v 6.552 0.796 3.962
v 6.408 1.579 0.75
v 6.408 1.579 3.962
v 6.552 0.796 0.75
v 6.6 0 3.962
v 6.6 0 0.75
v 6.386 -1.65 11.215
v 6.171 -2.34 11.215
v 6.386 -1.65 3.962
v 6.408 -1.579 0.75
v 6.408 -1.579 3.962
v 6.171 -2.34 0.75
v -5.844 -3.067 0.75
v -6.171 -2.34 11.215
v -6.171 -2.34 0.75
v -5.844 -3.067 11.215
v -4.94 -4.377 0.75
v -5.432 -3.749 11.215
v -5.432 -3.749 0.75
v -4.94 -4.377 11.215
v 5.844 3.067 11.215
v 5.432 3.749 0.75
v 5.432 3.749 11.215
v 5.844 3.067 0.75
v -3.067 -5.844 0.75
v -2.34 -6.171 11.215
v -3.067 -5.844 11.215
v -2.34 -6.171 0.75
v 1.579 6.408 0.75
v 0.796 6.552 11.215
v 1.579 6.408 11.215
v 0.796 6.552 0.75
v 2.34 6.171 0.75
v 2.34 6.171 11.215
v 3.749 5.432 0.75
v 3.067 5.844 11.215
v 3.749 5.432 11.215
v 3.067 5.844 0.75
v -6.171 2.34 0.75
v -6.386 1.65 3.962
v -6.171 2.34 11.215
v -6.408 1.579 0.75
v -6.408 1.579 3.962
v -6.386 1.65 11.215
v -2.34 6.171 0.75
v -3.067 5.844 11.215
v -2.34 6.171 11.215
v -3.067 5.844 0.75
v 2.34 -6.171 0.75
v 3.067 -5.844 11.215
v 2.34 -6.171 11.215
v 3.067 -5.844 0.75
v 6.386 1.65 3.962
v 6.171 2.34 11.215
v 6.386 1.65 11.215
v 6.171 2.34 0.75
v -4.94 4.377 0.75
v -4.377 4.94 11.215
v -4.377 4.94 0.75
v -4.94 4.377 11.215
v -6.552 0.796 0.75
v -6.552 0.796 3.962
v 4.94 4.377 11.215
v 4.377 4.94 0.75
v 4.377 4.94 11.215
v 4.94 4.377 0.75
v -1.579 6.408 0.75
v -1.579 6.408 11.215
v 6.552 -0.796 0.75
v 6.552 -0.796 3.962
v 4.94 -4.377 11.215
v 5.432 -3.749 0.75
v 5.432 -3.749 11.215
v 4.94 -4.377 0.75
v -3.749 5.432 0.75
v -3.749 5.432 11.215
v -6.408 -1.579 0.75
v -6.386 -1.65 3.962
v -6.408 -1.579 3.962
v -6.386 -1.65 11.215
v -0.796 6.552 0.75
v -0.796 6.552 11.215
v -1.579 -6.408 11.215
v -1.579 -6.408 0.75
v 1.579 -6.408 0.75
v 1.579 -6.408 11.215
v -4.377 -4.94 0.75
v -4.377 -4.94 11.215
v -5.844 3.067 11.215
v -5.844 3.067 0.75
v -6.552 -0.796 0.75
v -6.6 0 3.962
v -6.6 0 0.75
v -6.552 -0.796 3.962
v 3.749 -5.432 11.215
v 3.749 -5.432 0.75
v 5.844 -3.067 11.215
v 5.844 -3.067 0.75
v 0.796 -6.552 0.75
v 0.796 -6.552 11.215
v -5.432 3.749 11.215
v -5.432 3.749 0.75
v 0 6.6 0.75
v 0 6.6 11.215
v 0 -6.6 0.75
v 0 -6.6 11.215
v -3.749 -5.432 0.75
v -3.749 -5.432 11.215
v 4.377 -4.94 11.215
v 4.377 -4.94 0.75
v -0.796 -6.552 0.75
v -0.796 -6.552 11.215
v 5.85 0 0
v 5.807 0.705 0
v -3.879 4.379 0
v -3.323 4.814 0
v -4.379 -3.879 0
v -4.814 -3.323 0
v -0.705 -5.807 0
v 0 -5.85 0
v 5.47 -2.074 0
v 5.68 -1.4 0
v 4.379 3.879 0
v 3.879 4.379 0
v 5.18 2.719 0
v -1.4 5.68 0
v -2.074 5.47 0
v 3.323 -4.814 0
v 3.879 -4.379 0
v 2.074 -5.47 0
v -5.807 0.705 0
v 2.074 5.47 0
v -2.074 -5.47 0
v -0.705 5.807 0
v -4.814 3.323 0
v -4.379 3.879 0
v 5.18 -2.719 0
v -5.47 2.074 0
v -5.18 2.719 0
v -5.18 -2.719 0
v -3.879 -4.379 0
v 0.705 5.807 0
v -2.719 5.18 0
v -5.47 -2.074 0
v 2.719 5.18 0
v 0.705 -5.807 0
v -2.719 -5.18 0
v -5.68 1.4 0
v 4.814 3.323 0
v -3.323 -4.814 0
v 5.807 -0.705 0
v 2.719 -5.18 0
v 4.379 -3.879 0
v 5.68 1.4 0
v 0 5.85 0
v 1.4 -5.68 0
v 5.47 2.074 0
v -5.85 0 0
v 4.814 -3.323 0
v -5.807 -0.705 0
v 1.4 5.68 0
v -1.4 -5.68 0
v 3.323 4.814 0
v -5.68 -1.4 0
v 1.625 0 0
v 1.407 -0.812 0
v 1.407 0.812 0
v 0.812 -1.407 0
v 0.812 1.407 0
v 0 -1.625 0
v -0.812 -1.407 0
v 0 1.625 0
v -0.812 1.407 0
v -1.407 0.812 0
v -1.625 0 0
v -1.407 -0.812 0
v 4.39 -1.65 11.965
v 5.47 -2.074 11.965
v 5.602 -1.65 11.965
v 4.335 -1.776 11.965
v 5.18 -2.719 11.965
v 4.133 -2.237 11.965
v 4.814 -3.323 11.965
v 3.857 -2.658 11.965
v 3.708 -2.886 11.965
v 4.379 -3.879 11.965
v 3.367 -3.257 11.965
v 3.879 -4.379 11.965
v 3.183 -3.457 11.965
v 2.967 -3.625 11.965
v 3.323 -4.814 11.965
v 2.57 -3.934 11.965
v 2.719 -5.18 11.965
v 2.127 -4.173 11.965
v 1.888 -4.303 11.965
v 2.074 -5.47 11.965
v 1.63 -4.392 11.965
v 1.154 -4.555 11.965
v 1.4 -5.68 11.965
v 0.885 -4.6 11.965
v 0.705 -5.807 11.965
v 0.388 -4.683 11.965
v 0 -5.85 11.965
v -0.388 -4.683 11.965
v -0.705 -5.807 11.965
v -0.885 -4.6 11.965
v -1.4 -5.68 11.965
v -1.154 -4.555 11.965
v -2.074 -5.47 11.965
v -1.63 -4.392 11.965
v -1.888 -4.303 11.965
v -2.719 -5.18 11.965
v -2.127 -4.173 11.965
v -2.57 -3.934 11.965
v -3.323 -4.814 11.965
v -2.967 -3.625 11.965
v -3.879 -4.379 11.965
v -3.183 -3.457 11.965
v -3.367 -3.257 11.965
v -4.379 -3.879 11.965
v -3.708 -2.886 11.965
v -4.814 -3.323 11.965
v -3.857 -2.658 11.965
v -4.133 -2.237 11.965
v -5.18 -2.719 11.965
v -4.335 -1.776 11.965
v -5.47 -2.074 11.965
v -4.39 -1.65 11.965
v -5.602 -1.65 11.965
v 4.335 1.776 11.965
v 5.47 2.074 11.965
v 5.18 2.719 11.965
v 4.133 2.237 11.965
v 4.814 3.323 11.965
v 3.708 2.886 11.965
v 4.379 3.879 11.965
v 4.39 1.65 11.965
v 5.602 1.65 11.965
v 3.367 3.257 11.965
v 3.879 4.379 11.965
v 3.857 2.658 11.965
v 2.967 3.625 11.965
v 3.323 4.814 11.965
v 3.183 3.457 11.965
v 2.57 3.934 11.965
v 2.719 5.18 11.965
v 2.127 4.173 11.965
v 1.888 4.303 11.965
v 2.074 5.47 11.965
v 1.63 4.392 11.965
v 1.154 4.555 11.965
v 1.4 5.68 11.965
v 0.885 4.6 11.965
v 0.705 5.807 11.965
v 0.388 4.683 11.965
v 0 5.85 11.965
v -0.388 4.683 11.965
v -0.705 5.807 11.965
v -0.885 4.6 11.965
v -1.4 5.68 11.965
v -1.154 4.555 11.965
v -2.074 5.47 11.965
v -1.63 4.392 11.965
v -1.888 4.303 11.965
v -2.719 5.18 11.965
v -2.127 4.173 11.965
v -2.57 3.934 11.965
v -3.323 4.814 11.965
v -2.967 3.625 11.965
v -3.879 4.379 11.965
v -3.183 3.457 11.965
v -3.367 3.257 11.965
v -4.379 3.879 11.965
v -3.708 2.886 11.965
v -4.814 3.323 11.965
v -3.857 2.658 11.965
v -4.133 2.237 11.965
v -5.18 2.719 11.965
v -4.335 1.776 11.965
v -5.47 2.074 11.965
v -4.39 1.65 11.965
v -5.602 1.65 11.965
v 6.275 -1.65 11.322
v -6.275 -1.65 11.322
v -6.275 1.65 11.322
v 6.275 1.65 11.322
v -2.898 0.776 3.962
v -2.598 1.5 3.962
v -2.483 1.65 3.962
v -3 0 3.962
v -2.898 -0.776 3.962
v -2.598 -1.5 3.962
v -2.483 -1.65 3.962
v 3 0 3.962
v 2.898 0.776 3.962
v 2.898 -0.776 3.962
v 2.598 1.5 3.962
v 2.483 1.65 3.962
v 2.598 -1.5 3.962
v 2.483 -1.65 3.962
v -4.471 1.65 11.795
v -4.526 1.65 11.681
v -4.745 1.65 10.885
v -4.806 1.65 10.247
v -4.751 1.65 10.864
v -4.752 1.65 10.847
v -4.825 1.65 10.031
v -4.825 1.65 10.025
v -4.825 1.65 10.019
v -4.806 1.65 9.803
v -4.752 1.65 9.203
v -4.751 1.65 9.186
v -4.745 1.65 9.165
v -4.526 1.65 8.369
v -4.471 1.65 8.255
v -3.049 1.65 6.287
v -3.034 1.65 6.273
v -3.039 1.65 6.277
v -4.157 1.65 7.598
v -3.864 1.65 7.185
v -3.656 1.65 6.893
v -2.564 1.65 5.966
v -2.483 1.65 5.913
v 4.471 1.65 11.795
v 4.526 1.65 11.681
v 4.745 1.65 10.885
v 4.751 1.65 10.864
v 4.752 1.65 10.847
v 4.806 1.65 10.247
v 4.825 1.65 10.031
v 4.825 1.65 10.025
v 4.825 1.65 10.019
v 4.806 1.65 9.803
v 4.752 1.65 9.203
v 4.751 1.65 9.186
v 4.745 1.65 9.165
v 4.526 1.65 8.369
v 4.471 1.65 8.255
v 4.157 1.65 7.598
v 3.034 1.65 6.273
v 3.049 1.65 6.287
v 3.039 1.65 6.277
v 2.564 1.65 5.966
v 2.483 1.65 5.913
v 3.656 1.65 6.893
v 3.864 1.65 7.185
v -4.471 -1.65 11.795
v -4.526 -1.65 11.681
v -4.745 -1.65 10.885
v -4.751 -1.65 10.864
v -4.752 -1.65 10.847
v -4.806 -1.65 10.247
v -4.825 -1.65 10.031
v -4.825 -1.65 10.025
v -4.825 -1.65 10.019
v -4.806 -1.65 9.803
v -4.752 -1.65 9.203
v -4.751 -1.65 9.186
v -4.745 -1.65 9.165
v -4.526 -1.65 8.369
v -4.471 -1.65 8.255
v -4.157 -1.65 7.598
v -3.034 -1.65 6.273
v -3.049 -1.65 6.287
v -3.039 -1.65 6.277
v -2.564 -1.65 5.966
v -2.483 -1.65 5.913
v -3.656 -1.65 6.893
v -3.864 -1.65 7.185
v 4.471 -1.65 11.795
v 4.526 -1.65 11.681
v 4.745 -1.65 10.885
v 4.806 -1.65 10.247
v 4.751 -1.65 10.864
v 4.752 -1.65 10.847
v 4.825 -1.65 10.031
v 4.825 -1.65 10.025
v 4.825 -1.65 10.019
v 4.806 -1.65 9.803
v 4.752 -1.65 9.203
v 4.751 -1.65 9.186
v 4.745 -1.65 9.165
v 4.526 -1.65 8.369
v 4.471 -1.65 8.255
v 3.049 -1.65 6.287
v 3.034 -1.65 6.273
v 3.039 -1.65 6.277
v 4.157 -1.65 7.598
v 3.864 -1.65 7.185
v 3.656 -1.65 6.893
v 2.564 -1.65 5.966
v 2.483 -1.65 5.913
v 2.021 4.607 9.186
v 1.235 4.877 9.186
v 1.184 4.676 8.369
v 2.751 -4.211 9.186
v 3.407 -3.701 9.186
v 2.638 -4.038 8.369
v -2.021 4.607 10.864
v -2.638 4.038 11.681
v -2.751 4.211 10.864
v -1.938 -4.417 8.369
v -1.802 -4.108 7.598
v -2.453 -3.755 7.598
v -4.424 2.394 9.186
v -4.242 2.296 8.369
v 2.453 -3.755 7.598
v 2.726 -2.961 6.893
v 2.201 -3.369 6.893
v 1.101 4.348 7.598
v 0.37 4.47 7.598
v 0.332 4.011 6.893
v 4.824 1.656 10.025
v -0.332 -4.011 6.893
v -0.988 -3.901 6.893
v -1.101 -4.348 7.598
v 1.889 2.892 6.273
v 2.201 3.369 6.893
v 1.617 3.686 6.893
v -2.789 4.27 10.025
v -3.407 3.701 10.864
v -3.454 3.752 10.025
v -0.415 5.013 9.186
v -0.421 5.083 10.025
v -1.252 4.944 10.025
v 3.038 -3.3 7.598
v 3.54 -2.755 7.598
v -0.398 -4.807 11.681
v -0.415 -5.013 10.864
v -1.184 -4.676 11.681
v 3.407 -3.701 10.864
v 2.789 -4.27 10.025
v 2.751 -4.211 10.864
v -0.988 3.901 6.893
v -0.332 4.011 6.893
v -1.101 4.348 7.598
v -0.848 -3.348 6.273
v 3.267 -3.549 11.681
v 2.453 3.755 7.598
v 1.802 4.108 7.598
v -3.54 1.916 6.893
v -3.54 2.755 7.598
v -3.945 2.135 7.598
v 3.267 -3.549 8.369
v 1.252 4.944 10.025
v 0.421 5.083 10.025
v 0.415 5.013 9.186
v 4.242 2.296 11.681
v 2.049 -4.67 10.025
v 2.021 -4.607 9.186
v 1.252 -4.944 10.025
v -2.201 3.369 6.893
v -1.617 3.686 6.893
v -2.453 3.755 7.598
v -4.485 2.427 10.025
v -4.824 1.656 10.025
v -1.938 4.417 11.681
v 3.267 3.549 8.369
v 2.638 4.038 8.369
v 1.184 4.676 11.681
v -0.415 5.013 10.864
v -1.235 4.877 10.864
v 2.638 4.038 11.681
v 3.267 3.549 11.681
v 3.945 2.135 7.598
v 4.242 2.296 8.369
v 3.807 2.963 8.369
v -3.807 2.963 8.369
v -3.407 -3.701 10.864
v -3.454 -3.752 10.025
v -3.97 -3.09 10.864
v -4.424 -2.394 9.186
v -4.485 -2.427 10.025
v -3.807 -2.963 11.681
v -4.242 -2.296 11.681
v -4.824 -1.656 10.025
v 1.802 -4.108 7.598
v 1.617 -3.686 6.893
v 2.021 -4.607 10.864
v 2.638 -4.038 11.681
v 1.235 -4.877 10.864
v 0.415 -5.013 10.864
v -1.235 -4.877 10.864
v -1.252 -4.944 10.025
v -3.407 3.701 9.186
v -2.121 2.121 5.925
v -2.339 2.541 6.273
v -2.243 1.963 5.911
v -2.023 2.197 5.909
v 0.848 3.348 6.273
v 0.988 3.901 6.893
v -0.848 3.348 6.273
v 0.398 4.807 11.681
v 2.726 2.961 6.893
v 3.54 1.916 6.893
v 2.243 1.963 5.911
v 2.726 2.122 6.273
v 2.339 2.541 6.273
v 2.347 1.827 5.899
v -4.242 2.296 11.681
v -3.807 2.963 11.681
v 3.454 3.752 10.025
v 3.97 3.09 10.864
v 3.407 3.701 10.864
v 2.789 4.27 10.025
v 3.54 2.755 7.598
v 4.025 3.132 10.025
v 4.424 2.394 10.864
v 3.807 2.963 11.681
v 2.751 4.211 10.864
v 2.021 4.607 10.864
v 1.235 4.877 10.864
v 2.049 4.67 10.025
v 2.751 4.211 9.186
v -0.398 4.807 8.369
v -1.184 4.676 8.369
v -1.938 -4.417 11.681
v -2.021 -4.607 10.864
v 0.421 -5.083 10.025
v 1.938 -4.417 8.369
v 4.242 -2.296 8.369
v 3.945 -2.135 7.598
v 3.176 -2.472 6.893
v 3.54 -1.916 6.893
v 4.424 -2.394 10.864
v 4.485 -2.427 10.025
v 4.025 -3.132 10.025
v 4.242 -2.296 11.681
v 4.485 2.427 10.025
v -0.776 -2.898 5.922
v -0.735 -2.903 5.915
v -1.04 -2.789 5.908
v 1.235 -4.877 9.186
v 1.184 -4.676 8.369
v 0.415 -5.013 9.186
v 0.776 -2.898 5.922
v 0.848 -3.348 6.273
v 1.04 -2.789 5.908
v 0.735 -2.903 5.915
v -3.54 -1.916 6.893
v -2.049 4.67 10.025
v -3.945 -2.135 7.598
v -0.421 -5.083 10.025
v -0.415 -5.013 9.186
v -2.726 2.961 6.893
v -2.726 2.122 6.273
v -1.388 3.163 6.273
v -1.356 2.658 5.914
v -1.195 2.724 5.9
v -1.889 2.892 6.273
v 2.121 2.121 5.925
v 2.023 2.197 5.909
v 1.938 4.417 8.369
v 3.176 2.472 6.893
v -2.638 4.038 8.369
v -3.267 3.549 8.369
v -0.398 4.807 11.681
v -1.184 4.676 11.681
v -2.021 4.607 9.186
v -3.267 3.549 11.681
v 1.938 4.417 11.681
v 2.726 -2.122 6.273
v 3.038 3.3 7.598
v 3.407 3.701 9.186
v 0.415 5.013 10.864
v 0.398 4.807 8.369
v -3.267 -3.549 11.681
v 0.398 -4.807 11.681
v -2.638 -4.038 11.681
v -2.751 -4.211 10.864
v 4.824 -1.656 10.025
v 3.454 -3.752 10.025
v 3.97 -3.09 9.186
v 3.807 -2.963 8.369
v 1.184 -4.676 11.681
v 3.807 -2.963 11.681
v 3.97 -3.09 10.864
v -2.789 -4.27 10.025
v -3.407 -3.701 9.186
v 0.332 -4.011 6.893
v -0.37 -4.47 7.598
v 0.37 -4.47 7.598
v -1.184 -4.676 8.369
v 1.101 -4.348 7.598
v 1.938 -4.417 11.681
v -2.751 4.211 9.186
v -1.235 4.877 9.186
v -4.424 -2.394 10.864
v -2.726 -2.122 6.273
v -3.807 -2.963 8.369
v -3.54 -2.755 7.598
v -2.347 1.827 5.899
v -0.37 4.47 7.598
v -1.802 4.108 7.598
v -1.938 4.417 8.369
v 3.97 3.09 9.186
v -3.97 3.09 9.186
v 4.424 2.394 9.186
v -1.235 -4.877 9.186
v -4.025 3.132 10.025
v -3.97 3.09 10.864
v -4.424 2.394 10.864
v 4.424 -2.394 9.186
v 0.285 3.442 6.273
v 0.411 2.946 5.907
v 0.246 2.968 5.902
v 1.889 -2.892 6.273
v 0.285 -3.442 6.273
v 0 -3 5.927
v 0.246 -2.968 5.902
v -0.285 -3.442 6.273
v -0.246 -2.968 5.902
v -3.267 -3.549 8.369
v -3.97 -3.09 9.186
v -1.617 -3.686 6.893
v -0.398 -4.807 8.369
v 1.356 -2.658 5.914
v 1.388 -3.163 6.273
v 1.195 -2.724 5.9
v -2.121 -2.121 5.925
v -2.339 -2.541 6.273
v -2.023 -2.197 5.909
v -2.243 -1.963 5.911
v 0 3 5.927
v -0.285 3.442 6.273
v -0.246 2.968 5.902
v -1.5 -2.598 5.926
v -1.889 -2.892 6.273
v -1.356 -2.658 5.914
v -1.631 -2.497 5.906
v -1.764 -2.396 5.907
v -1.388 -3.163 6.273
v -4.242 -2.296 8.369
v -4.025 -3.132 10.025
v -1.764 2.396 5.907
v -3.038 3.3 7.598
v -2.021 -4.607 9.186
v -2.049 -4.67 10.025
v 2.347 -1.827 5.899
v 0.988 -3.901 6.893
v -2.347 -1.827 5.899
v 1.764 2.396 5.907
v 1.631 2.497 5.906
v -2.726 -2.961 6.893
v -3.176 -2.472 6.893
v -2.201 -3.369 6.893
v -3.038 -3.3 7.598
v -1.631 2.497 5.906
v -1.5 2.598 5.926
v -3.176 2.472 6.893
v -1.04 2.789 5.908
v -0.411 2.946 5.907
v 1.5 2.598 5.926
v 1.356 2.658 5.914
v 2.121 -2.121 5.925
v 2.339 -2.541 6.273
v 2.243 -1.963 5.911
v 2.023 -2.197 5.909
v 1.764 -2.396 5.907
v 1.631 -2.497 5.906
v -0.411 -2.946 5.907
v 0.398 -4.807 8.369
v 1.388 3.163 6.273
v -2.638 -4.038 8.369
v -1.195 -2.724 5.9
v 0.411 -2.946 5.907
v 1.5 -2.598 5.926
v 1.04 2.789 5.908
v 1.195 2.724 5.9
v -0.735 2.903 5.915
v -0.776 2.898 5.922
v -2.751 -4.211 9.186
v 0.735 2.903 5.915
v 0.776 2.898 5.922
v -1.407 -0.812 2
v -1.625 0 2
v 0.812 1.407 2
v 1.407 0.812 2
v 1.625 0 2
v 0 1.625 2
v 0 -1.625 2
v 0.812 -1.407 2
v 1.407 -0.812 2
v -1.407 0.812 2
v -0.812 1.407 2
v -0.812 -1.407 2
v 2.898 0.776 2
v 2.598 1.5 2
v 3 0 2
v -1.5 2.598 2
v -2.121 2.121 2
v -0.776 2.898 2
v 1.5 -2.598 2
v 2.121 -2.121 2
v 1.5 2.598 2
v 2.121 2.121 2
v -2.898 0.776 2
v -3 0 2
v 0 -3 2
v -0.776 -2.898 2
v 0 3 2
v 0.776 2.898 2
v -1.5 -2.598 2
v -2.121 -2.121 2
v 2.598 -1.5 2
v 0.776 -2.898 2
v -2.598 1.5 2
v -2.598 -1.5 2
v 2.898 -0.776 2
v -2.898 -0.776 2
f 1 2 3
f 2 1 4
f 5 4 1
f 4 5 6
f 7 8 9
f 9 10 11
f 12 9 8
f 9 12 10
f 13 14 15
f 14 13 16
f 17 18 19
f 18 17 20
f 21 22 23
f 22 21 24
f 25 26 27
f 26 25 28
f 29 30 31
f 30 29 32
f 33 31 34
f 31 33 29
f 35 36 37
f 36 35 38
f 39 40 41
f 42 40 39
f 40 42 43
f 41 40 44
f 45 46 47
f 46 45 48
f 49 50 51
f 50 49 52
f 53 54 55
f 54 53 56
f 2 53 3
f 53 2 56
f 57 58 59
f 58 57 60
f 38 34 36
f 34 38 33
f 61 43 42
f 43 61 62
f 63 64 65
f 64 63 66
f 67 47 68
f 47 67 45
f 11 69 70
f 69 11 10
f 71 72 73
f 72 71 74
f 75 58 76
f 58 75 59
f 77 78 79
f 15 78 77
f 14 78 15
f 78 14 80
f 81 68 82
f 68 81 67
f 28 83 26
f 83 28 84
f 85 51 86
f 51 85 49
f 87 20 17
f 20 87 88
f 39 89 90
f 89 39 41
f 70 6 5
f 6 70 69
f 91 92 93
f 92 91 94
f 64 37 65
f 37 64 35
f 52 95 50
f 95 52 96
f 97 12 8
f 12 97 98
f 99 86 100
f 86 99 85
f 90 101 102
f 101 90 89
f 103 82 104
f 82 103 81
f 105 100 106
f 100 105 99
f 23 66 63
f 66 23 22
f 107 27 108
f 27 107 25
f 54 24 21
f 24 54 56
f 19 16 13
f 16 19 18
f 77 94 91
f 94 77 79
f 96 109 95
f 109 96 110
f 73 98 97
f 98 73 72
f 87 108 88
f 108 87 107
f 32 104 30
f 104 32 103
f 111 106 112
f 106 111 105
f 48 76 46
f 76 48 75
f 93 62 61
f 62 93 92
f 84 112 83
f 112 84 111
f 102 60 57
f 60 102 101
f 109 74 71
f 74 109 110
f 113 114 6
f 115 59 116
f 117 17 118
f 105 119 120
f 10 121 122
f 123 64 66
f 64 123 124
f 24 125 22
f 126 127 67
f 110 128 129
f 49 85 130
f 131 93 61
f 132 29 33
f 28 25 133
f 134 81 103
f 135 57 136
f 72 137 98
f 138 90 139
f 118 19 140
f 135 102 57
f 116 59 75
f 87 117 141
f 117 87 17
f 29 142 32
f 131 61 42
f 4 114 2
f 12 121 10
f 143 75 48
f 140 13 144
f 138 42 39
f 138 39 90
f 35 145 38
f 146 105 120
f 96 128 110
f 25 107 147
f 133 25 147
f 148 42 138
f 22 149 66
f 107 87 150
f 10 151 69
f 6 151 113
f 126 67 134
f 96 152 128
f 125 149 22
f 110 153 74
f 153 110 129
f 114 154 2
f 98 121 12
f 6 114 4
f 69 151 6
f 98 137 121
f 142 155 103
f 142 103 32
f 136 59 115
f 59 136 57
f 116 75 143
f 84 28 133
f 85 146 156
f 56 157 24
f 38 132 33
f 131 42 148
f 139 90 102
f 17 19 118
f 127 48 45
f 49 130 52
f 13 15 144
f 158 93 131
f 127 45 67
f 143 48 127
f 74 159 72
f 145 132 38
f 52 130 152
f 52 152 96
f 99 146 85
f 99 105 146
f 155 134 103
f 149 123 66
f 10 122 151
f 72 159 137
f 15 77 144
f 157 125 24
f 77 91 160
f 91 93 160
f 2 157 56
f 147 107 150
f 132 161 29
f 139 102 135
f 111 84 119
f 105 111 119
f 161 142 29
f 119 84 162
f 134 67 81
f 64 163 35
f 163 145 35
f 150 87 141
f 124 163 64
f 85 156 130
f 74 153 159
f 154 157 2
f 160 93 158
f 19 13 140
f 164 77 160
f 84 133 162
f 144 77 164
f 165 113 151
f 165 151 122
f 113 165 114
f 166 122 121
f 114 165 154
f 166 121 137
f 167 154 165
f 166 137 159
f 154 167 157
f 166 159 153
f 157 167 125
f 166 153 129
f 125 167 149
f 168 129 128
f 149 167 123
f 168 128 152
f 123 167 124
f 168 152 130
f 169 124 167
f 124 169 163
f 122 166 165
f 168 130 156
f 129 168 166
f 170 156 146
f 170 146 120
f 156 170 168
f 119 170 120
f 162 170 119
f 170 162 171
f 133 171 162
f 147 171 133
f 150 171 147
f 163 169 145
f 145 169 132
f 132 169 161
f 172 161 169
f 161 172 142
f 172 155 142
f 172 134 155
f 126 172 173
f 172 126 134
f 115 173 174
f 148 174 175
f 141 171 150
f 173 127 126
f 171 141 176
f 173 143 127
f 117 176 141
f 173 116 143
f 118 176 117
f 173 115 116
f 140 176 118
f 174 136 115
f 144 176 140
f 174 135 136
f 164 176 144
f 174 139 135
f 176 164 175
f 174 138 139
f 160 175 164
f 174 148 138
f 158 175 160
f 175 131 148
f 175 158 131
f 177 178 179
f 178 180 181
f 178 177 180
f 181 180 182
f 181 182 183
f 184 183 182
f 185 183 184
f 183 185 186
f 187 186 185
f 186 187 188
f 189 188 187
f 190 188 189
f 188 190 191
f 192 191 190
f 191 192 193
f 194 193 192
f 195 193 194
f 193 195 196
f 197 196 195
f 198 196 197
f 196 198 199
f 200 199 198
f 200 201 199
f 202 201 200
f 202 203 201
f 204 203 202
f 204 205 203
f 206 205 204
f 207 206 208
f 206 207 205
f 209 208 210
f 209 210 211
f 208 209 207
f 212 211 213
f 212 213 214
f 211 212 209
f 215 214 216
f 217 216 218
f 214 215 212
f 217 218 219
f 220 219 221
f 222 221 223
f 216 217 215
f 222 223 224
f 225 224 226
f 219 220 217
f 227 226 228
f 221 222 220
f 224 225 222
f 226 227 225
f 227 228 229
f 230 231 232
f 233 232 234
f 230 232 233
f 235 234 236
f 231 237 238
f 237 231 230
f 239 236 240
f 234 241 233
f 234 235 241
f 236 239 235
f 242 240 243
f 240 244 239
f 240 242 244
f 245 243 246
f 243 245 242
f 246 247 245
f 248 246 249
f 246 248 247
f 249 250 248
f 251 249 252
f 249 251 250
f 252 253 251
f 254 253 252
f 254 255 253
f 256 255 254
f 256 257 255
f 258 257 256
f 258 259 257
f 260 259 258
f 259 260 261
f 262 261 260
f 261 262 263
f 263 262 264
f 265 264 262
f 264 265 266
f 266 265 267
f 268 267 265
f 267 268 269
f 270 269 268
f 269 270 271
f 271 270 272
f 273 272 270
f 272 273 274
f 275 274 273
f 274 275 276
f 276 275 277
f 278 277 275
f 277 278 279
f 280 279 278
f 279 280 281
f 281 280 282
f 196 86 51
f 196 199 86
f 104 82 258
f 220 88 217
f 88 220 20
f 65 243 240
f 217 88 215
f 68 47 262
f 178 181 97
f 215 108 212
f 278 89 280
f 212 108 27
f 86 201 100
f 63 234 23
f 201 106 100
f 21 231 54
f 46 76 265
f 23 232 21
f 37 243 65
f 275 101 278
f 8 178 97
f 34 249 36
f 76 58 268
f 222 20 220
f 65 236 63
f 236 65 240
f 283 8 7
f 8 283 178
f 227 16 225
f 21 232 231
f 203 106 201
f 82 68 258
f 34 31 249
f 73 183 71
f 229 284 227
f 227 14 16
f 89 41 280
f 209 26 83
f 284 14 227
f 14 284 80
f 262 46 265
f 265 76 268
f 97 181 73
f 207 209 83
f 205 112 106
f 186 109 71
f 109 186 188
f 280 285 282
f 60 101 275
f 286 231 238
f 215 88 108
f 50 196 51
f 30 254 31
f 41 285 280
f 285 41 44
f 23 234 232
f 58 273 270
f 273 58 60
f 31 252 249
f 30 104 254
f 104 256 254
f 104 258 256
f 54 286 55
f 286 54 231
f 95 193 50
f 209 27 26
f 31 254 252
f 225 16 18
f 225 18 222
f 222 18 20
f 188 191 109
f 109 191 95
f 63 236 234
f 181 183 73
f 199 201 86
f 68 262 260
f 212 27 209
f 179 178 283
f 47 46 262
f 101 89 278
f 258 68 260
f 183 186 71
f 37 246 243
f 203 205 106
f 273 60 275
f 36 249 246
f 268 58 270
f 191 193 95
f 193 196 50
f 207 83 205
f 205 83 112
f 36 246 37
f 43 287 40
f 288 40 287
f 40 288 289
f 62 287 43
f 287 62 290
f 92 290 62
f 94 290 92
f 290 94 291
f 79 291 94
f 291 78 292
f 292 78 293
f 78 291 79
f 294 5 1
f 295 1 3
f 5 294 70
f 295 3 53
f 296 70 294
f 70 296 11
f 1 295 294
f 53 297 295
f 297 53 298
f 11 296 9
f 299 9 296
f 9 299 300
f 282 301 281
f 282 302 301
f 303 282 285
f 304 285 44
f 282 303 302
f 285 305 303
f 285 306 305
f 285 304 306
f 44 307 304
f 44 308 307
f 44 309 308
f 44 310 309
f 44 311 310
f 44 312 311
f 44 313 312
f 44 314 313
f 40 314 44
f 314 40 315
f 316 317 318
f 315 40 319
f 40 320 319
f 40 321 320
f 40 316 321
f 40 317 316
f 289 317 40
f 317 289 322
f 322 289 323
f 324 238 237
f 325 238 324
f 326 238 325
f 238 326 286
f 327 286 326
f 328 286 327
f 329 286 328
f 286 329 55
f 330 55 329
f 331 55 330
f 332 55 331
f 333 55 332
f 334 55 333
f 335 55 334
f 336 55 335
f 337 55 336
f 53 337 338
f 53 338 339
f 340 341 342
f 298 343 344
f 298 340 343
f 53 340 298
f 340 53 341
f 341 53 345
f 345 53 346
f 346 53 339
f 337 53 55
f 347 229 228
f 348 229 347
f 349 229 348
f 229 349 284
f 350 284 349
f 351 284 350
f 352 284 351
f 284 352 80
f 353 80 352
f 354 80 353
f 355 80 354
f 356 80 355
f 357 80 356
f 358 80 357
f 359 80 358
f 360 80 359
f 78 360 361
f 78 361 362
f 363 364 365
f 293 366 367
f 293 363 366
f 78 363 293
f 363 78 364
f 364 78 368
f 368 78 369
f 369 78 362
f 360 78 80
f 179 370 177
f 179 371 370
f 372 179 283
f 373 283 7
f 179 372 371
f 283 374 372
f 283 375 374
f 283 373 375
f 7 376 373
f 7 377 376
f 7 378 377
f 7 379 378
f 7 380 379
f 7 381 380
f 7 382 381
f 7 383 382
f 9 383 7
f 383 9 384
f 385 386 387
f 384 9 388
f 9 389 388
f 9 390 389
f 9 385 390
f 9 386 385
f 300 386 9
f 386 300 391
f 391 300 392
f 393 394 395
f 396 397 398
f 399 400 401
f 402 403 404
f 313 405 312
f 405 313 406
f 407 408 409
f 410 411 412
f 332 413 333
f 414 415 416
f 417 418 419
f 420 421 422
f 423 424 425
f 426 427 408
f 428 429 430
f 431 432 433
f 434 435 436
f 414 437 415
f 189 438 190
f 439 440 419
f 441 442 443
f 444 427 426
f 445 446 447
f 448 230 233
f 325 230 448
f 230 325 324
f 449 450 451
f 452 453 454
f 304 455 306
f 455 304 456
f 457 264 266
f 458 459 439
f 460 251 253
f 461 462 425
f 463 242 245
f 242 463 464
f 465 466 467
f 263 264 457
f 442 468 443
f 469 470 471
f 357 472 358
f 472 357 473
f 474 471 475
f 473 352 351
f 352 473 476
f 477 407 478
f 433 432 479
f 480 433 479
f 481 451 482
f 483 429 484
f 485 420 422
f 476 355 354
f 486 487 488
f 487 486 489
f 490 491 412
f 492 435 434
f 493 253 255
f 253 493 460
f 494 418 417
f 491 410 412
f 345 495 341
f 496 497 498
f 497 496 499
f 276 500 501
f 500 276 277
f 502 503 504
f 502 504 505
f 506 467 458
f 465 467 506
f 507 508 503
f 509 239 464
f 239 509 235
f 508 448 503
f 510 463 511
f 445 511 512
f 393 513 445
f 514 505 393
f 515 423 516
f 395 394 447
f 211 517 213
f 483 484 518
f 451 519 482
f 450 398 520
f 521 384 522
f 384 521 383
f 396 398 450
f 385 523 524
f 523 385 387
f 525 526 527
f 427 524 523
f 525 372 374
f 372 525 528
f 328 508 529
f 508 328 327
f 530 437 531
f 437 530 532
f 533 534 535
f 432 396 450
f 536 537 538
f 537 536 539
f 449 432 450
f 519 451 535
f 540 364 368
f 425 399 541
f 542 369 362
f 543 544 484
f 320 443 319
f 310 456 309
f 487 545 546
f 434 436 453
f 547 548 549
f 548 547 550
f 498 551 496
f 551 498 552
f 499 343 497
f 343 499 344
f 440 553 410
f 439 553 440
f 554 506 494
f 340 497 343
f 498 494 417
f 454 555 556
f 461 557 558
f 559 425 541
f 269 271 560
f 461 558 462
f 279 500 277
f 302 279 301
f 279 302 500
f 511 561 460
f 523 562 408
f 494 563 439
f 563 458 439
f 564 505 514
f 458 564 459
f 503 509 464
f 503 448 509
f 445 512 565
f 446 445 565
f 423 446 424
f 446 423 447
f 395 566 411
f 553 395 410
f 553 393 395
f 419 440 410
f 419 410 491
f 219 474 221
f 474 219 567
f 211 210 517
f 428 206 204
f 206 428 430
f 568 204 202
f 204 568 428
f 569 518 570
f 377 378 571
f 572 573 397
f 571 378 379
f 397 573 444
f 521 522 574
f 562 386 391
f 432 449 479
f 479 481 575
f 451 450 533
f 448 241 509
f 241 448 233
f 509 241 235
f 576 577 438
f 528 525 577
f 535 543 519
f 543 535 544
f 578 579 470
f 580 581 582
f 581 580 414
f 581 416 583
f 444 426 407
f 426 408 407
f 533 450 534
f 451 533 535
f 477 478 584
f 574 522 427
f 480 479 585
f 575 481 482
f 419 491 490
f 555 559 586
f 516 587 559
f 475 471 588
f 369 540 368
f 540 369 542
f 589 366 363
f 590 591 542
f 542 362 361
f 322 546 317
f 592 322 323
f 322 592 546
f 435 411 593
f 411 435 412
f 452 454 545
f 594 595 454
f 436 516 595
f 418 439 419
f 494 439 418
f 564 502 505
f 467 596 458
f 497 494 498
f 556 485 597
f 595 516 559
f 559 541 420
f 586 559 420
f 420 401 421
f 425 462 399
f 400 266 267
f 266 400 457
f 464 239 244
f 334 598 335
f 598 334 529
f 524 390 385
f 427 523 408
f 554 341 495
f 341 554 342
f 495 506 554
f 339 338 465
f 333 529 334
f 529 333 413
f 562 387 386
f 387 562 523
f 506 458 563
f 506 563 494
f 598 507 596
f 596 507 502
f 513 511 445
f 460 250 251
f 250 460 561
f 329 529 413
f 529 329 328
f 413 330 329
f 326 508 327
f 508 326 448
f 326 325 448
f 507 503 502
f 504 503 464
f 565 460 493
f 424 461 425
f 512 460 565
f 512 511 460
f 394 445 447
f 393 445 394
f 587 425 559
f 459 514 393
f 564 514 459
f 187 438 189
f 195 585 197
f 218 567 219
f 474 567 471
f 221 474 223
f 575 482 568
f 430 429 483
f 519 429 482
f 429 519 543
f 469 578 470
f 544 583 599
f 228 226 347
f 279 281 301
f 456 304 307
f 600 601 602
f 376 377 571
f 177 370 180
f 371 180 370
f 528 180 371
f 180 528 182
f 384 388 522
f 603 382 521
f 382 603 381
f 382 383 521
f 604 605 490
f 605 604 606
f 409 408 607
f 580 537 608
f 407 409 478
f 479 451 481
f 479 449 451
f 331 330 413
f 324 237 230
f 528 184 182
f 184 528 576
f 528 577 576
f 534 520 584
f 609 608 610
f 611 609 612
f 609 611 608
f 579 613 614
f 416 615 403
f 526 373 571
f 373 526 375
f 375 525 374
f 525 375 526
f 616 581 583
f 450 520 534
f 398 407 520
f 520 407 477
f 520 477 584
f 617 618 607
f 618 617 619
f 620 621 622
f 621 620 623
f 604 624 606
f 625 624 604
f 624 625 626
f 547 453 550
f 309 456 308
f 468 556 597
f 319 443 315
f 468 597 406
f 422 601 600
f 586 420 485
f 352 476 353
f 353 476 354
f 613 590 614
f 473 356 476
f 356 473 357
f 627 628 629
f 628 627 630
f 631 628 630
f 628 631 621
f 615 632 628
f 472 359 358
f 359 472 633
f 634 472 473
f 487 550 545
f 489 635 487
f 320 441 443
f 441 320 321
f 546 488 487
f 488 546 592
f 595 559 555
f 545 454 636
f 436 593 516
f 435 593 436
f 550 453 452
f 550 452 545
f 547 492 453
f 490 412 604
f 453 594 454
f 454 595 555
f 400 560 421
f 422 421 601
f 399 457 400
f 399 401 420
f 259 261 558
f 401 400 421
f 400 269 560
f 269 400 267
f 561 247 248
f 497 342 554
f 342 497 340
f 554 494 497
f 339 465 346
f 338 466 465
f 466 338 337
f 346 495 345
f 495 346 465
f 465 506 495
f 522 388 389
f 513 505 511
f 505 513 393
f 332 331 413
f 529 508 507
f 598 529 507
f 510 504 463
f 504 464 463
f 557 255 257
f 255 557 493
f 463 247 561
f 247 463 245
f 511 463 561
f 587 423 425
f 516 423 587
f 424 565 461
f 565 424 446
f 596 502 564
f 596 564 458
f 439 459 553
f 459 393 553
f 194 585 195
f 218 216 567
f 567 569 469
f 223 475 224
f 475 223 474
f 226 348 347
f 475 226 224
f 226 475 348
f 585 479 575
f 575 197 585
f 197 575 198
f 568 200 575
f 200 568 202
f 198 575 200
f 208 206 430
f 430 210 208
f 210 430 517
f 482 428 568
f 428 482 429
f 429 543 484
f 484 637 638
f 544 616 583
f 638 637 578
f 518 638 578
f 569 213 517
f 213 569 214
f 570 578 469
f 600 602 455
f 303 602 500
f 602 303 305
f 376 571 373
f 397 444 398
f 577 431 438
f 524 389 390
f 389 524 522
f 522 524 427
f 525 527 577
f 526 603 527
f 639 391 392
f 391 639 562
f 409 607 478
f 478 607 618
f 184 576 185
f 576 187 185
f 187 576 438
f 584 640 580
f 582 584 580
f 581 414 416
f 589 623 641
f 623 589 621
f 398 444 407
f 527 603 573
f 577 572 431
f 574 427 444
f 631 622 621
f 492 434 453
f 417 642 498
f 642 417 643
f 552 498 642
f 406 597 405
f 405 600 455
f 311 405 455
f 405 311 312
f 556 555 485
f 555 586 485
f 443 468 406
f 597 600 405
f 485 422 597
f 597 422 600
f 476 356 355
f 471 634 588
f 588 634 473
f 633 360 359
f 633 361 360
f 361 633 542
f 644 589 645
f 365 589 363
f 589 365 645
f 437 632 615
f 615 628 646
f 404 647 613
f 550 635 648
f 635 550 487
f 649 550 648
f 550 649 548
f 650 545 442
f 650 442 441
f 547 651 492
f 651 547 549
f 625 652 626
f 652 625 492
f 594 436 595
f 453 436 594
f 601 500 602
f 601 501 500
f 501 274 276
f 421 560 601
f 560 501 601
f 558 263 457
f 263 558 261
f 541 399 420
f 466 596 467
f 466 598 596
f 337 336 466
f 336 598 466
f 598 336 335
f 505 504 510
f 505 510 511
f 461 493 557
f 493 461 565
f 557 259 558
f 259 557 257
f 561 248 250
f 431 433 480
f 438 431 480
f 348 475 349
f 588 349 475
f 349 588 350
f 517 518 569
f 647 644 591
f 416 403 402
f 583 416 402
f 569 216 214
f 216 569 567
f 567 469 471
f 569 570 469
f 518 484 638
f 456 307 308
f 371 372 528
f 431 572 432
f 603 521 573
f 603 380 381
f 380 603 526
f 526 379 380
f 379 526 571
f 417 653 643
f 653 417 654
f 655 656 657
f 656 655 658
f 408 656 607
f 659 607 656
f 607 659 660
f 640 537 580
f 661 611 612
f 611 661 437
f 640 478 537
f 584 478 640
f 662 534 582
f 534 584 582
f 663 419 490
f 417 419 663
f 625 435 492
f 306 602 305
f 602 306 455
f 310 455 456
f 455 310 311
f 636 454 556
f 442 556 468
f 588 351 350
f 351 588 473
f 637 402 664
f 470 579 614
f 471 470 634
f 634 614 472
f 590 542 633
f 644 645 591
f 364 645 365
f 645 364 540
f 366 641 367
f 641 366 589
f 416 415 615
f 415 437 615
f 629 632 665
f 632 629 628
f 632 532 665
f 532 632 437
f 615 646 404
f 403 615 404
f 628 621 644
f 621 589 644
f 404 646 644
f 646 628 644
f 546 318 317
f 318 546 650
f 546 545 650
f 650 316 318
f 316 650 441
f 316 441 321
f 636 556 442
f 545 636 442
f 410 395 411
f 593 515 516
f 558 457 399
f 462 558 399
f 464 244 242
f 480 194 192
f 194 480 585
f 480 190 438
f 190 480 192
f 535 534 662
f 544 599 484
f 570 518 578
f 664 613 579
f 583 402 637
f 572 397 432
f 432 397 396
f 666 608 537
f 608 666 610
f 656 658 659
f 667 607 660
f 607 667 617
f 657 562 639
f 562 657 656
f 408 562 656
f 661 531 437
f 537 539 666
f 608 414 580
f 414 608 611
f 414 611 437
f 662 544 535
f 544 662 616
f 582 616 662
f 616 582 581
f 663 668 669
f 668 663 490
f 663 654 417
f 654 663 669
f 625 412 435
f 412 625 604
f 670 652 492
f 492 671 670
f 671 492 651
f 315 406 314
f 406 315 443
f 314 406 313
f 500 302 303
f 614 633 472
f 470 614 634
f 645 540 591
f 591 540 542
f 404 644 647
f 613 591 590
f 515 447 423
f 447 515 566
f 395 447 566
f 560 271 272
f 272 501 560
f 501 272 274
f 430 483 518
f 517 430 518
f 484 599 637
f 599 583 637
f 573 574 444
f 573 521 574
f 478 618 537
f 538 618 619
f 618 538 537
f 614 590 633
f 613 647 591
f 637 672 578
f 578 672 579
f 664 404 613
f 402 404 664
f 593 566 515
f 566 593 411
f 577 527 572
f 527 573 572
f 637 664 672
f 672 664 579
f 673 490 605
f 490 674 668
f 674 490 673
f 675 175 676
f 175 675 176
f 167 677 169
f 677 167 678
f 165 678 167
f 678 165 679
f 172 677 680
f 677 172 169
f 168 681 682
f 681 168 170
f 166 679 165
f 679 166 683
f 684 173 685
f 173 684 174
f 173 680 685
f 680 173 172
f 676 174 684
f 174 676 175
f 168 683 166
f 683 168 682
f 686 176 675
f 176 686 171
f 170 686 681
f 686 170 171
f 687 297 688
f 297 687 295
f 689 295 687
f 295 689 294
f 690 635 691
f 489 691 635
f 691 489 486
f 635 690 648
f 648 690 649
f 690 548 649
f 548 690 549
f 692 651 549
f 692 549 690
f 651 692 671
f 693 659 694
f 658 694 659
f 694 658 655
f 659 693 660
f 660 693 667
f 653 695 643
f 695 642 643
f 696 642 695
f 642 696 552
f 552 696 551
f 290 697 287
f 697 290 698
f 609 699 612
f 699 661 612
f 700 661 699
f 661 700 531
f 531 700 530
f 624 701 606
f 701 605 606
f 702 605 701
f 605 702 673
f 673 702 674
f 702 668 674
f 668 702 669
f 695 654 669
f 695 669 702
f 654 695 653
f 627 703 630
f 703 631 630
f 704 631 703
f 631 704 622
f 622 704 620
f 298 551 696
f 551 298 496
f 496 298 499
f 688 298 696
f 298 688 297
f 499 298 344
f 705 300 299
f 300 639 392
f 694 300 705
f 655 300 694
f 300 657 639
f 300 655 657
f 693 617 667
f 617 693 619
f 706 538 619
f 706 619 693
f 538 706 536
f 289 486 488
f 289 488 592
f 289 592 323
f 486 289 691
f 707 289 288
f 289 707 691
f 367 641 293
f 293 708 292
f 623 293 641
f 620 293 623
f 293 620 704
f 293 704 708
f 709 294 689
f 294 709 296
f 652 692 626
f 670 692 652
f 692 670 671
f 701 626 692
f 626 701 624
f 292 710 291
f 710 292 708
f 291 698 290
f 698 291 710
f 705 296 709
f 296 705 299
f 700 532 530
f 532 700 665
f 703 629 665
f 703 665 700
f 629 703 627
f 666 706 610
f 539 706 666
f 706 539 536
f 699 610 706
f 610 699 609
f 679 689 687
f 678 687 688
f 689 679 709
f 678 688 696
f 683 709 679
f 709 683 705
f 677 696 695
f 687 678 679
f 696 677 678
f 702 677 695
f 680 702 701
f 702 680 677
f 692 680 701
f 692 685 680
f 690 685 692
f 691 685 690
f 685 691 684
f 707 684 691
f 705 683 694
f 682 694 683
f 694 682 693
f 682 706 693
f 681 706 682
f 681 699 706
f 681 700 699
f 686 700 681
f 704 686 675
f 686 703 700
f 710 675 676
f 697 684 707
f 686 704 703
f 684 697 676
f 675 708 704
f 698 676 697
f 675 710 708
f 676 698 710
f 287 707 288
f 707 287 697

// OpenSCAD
// Ballcaster (part of Escornabot Project)
// (c) 2015, Xoan Sampaiño
//
// Based on BallCasterV2 by PieterBos
// http://www.thingiverse.com/thing:20471
//
// Released under the MIT License

ball_size = 9.7; // ball diameter
airgap = 0.25;    // gap between ball and wall

recess = 11;   // distance from ball to rear
hole_sep = 39; // distance between mounting holes

wall_thickness = 1.5;
total_height = 9.5*1.25-1+4;	// this includes the ball
ball_protrude = 0.30;	// percentage of ball radius sticking out
chamfer = 0.75;

// set fn to false to automatic face number calculation
// useful in some cases (i.e. to import into freecad)
fn = true;



overlap = 1; // to use in some differences

cyl_rad = (ball_size/2) + wall_thickness + airgap;
echo (cyl_rad);

module ball_mount () {
  difference () {
    union() {
      translate([0, 0, chamfer])
        cylinder(r = cyl_rad, h = total_height-(ball_size*ball_protrude)-chamfer*2, $fn = fn ? round(cyl_rad*2)*4 : 0);

      // bottom chamfer
      cylinder(r1 = cyl_rad-chamfer, r2 = cyl_rad, h = chamfer, $fn = fn ? round(cyl_rad*2)*4 : 0);

      // top chamfer
      translate([0, 0, total_height-(ball_size*ball_protrude)-chamfer])
        cylinder(r1 = cyl_rad, r2 = cyl_rad-chamfer, h = chamfer, $fn = fn ? round(cyl_rad*2)*4 : 0);
    }

    translate([0, 0, total_height-ball_size/2])
      for (i = [0])
        rotate([0, 0, i])
          cube(size = [cyl_rad*2+5, cyl_rad/2, ball_size*1.25], center = true );

    translate([0, 0, total_height-(ball_size/2)]) {
      %sphere (ball_size/2, $fn = fn ? ball_size*4 : 0);
      sphere (ball_size/2+airgap, $fn = fn ? ball_size*4 : 0);
    }
  }
}

module base() {
  difference() {
    hull() {
      // base
      translate([(hole_sep+3)/2-4, 0, 0])
        cube([hole_sep+3, 20, 3], center = true);
      // rear screw
      translate([hole_sep, 0, 0])
        cylinder(r = 8/2, h = 3, $fn = fn ? 8*4 : 0, center = true);
    }

    // sides
    for (i = [10,-10])
      translate([0, i, 0])
        cube([(hole_sep+4)*2, 10, 3+overlap], center = true);
  }
}

module base_holes() {
  // front screw hole
  cylinder(r = 3.5/2, h = 3 + overlap, $fn = fn ? round(3.5)*4 : 0, center = true);

  // rear screw hole
  translate([hole_sep, 0, 0])
    cylinder(r = 3.5/2, h = 3 + overlap, $fn = fn ? round(3.5)*4 : 0, center = true);

  // rear screw head
  translate([hole_sep, 0, (20+3)/2])
    cylinder(r = 6.5/2, h = 20, $fn = fn ? round(6.5)*4 : 0, center = true);
}

difference() {
  union() {
    *base();

    //translate([hole_sep-recess,0,-3/2])
      ball_mount();
  }

  *base_holes();
  cylinder(r=3.25/2,h=5,$fn=3*4);
  translate([0,0,2])cylinder(r=6/2,h=10,$fn=6*4);

  *translate([-5,ball_size/2+airgap+wall_thickness-1,0])cube([10,10,15]);
}
